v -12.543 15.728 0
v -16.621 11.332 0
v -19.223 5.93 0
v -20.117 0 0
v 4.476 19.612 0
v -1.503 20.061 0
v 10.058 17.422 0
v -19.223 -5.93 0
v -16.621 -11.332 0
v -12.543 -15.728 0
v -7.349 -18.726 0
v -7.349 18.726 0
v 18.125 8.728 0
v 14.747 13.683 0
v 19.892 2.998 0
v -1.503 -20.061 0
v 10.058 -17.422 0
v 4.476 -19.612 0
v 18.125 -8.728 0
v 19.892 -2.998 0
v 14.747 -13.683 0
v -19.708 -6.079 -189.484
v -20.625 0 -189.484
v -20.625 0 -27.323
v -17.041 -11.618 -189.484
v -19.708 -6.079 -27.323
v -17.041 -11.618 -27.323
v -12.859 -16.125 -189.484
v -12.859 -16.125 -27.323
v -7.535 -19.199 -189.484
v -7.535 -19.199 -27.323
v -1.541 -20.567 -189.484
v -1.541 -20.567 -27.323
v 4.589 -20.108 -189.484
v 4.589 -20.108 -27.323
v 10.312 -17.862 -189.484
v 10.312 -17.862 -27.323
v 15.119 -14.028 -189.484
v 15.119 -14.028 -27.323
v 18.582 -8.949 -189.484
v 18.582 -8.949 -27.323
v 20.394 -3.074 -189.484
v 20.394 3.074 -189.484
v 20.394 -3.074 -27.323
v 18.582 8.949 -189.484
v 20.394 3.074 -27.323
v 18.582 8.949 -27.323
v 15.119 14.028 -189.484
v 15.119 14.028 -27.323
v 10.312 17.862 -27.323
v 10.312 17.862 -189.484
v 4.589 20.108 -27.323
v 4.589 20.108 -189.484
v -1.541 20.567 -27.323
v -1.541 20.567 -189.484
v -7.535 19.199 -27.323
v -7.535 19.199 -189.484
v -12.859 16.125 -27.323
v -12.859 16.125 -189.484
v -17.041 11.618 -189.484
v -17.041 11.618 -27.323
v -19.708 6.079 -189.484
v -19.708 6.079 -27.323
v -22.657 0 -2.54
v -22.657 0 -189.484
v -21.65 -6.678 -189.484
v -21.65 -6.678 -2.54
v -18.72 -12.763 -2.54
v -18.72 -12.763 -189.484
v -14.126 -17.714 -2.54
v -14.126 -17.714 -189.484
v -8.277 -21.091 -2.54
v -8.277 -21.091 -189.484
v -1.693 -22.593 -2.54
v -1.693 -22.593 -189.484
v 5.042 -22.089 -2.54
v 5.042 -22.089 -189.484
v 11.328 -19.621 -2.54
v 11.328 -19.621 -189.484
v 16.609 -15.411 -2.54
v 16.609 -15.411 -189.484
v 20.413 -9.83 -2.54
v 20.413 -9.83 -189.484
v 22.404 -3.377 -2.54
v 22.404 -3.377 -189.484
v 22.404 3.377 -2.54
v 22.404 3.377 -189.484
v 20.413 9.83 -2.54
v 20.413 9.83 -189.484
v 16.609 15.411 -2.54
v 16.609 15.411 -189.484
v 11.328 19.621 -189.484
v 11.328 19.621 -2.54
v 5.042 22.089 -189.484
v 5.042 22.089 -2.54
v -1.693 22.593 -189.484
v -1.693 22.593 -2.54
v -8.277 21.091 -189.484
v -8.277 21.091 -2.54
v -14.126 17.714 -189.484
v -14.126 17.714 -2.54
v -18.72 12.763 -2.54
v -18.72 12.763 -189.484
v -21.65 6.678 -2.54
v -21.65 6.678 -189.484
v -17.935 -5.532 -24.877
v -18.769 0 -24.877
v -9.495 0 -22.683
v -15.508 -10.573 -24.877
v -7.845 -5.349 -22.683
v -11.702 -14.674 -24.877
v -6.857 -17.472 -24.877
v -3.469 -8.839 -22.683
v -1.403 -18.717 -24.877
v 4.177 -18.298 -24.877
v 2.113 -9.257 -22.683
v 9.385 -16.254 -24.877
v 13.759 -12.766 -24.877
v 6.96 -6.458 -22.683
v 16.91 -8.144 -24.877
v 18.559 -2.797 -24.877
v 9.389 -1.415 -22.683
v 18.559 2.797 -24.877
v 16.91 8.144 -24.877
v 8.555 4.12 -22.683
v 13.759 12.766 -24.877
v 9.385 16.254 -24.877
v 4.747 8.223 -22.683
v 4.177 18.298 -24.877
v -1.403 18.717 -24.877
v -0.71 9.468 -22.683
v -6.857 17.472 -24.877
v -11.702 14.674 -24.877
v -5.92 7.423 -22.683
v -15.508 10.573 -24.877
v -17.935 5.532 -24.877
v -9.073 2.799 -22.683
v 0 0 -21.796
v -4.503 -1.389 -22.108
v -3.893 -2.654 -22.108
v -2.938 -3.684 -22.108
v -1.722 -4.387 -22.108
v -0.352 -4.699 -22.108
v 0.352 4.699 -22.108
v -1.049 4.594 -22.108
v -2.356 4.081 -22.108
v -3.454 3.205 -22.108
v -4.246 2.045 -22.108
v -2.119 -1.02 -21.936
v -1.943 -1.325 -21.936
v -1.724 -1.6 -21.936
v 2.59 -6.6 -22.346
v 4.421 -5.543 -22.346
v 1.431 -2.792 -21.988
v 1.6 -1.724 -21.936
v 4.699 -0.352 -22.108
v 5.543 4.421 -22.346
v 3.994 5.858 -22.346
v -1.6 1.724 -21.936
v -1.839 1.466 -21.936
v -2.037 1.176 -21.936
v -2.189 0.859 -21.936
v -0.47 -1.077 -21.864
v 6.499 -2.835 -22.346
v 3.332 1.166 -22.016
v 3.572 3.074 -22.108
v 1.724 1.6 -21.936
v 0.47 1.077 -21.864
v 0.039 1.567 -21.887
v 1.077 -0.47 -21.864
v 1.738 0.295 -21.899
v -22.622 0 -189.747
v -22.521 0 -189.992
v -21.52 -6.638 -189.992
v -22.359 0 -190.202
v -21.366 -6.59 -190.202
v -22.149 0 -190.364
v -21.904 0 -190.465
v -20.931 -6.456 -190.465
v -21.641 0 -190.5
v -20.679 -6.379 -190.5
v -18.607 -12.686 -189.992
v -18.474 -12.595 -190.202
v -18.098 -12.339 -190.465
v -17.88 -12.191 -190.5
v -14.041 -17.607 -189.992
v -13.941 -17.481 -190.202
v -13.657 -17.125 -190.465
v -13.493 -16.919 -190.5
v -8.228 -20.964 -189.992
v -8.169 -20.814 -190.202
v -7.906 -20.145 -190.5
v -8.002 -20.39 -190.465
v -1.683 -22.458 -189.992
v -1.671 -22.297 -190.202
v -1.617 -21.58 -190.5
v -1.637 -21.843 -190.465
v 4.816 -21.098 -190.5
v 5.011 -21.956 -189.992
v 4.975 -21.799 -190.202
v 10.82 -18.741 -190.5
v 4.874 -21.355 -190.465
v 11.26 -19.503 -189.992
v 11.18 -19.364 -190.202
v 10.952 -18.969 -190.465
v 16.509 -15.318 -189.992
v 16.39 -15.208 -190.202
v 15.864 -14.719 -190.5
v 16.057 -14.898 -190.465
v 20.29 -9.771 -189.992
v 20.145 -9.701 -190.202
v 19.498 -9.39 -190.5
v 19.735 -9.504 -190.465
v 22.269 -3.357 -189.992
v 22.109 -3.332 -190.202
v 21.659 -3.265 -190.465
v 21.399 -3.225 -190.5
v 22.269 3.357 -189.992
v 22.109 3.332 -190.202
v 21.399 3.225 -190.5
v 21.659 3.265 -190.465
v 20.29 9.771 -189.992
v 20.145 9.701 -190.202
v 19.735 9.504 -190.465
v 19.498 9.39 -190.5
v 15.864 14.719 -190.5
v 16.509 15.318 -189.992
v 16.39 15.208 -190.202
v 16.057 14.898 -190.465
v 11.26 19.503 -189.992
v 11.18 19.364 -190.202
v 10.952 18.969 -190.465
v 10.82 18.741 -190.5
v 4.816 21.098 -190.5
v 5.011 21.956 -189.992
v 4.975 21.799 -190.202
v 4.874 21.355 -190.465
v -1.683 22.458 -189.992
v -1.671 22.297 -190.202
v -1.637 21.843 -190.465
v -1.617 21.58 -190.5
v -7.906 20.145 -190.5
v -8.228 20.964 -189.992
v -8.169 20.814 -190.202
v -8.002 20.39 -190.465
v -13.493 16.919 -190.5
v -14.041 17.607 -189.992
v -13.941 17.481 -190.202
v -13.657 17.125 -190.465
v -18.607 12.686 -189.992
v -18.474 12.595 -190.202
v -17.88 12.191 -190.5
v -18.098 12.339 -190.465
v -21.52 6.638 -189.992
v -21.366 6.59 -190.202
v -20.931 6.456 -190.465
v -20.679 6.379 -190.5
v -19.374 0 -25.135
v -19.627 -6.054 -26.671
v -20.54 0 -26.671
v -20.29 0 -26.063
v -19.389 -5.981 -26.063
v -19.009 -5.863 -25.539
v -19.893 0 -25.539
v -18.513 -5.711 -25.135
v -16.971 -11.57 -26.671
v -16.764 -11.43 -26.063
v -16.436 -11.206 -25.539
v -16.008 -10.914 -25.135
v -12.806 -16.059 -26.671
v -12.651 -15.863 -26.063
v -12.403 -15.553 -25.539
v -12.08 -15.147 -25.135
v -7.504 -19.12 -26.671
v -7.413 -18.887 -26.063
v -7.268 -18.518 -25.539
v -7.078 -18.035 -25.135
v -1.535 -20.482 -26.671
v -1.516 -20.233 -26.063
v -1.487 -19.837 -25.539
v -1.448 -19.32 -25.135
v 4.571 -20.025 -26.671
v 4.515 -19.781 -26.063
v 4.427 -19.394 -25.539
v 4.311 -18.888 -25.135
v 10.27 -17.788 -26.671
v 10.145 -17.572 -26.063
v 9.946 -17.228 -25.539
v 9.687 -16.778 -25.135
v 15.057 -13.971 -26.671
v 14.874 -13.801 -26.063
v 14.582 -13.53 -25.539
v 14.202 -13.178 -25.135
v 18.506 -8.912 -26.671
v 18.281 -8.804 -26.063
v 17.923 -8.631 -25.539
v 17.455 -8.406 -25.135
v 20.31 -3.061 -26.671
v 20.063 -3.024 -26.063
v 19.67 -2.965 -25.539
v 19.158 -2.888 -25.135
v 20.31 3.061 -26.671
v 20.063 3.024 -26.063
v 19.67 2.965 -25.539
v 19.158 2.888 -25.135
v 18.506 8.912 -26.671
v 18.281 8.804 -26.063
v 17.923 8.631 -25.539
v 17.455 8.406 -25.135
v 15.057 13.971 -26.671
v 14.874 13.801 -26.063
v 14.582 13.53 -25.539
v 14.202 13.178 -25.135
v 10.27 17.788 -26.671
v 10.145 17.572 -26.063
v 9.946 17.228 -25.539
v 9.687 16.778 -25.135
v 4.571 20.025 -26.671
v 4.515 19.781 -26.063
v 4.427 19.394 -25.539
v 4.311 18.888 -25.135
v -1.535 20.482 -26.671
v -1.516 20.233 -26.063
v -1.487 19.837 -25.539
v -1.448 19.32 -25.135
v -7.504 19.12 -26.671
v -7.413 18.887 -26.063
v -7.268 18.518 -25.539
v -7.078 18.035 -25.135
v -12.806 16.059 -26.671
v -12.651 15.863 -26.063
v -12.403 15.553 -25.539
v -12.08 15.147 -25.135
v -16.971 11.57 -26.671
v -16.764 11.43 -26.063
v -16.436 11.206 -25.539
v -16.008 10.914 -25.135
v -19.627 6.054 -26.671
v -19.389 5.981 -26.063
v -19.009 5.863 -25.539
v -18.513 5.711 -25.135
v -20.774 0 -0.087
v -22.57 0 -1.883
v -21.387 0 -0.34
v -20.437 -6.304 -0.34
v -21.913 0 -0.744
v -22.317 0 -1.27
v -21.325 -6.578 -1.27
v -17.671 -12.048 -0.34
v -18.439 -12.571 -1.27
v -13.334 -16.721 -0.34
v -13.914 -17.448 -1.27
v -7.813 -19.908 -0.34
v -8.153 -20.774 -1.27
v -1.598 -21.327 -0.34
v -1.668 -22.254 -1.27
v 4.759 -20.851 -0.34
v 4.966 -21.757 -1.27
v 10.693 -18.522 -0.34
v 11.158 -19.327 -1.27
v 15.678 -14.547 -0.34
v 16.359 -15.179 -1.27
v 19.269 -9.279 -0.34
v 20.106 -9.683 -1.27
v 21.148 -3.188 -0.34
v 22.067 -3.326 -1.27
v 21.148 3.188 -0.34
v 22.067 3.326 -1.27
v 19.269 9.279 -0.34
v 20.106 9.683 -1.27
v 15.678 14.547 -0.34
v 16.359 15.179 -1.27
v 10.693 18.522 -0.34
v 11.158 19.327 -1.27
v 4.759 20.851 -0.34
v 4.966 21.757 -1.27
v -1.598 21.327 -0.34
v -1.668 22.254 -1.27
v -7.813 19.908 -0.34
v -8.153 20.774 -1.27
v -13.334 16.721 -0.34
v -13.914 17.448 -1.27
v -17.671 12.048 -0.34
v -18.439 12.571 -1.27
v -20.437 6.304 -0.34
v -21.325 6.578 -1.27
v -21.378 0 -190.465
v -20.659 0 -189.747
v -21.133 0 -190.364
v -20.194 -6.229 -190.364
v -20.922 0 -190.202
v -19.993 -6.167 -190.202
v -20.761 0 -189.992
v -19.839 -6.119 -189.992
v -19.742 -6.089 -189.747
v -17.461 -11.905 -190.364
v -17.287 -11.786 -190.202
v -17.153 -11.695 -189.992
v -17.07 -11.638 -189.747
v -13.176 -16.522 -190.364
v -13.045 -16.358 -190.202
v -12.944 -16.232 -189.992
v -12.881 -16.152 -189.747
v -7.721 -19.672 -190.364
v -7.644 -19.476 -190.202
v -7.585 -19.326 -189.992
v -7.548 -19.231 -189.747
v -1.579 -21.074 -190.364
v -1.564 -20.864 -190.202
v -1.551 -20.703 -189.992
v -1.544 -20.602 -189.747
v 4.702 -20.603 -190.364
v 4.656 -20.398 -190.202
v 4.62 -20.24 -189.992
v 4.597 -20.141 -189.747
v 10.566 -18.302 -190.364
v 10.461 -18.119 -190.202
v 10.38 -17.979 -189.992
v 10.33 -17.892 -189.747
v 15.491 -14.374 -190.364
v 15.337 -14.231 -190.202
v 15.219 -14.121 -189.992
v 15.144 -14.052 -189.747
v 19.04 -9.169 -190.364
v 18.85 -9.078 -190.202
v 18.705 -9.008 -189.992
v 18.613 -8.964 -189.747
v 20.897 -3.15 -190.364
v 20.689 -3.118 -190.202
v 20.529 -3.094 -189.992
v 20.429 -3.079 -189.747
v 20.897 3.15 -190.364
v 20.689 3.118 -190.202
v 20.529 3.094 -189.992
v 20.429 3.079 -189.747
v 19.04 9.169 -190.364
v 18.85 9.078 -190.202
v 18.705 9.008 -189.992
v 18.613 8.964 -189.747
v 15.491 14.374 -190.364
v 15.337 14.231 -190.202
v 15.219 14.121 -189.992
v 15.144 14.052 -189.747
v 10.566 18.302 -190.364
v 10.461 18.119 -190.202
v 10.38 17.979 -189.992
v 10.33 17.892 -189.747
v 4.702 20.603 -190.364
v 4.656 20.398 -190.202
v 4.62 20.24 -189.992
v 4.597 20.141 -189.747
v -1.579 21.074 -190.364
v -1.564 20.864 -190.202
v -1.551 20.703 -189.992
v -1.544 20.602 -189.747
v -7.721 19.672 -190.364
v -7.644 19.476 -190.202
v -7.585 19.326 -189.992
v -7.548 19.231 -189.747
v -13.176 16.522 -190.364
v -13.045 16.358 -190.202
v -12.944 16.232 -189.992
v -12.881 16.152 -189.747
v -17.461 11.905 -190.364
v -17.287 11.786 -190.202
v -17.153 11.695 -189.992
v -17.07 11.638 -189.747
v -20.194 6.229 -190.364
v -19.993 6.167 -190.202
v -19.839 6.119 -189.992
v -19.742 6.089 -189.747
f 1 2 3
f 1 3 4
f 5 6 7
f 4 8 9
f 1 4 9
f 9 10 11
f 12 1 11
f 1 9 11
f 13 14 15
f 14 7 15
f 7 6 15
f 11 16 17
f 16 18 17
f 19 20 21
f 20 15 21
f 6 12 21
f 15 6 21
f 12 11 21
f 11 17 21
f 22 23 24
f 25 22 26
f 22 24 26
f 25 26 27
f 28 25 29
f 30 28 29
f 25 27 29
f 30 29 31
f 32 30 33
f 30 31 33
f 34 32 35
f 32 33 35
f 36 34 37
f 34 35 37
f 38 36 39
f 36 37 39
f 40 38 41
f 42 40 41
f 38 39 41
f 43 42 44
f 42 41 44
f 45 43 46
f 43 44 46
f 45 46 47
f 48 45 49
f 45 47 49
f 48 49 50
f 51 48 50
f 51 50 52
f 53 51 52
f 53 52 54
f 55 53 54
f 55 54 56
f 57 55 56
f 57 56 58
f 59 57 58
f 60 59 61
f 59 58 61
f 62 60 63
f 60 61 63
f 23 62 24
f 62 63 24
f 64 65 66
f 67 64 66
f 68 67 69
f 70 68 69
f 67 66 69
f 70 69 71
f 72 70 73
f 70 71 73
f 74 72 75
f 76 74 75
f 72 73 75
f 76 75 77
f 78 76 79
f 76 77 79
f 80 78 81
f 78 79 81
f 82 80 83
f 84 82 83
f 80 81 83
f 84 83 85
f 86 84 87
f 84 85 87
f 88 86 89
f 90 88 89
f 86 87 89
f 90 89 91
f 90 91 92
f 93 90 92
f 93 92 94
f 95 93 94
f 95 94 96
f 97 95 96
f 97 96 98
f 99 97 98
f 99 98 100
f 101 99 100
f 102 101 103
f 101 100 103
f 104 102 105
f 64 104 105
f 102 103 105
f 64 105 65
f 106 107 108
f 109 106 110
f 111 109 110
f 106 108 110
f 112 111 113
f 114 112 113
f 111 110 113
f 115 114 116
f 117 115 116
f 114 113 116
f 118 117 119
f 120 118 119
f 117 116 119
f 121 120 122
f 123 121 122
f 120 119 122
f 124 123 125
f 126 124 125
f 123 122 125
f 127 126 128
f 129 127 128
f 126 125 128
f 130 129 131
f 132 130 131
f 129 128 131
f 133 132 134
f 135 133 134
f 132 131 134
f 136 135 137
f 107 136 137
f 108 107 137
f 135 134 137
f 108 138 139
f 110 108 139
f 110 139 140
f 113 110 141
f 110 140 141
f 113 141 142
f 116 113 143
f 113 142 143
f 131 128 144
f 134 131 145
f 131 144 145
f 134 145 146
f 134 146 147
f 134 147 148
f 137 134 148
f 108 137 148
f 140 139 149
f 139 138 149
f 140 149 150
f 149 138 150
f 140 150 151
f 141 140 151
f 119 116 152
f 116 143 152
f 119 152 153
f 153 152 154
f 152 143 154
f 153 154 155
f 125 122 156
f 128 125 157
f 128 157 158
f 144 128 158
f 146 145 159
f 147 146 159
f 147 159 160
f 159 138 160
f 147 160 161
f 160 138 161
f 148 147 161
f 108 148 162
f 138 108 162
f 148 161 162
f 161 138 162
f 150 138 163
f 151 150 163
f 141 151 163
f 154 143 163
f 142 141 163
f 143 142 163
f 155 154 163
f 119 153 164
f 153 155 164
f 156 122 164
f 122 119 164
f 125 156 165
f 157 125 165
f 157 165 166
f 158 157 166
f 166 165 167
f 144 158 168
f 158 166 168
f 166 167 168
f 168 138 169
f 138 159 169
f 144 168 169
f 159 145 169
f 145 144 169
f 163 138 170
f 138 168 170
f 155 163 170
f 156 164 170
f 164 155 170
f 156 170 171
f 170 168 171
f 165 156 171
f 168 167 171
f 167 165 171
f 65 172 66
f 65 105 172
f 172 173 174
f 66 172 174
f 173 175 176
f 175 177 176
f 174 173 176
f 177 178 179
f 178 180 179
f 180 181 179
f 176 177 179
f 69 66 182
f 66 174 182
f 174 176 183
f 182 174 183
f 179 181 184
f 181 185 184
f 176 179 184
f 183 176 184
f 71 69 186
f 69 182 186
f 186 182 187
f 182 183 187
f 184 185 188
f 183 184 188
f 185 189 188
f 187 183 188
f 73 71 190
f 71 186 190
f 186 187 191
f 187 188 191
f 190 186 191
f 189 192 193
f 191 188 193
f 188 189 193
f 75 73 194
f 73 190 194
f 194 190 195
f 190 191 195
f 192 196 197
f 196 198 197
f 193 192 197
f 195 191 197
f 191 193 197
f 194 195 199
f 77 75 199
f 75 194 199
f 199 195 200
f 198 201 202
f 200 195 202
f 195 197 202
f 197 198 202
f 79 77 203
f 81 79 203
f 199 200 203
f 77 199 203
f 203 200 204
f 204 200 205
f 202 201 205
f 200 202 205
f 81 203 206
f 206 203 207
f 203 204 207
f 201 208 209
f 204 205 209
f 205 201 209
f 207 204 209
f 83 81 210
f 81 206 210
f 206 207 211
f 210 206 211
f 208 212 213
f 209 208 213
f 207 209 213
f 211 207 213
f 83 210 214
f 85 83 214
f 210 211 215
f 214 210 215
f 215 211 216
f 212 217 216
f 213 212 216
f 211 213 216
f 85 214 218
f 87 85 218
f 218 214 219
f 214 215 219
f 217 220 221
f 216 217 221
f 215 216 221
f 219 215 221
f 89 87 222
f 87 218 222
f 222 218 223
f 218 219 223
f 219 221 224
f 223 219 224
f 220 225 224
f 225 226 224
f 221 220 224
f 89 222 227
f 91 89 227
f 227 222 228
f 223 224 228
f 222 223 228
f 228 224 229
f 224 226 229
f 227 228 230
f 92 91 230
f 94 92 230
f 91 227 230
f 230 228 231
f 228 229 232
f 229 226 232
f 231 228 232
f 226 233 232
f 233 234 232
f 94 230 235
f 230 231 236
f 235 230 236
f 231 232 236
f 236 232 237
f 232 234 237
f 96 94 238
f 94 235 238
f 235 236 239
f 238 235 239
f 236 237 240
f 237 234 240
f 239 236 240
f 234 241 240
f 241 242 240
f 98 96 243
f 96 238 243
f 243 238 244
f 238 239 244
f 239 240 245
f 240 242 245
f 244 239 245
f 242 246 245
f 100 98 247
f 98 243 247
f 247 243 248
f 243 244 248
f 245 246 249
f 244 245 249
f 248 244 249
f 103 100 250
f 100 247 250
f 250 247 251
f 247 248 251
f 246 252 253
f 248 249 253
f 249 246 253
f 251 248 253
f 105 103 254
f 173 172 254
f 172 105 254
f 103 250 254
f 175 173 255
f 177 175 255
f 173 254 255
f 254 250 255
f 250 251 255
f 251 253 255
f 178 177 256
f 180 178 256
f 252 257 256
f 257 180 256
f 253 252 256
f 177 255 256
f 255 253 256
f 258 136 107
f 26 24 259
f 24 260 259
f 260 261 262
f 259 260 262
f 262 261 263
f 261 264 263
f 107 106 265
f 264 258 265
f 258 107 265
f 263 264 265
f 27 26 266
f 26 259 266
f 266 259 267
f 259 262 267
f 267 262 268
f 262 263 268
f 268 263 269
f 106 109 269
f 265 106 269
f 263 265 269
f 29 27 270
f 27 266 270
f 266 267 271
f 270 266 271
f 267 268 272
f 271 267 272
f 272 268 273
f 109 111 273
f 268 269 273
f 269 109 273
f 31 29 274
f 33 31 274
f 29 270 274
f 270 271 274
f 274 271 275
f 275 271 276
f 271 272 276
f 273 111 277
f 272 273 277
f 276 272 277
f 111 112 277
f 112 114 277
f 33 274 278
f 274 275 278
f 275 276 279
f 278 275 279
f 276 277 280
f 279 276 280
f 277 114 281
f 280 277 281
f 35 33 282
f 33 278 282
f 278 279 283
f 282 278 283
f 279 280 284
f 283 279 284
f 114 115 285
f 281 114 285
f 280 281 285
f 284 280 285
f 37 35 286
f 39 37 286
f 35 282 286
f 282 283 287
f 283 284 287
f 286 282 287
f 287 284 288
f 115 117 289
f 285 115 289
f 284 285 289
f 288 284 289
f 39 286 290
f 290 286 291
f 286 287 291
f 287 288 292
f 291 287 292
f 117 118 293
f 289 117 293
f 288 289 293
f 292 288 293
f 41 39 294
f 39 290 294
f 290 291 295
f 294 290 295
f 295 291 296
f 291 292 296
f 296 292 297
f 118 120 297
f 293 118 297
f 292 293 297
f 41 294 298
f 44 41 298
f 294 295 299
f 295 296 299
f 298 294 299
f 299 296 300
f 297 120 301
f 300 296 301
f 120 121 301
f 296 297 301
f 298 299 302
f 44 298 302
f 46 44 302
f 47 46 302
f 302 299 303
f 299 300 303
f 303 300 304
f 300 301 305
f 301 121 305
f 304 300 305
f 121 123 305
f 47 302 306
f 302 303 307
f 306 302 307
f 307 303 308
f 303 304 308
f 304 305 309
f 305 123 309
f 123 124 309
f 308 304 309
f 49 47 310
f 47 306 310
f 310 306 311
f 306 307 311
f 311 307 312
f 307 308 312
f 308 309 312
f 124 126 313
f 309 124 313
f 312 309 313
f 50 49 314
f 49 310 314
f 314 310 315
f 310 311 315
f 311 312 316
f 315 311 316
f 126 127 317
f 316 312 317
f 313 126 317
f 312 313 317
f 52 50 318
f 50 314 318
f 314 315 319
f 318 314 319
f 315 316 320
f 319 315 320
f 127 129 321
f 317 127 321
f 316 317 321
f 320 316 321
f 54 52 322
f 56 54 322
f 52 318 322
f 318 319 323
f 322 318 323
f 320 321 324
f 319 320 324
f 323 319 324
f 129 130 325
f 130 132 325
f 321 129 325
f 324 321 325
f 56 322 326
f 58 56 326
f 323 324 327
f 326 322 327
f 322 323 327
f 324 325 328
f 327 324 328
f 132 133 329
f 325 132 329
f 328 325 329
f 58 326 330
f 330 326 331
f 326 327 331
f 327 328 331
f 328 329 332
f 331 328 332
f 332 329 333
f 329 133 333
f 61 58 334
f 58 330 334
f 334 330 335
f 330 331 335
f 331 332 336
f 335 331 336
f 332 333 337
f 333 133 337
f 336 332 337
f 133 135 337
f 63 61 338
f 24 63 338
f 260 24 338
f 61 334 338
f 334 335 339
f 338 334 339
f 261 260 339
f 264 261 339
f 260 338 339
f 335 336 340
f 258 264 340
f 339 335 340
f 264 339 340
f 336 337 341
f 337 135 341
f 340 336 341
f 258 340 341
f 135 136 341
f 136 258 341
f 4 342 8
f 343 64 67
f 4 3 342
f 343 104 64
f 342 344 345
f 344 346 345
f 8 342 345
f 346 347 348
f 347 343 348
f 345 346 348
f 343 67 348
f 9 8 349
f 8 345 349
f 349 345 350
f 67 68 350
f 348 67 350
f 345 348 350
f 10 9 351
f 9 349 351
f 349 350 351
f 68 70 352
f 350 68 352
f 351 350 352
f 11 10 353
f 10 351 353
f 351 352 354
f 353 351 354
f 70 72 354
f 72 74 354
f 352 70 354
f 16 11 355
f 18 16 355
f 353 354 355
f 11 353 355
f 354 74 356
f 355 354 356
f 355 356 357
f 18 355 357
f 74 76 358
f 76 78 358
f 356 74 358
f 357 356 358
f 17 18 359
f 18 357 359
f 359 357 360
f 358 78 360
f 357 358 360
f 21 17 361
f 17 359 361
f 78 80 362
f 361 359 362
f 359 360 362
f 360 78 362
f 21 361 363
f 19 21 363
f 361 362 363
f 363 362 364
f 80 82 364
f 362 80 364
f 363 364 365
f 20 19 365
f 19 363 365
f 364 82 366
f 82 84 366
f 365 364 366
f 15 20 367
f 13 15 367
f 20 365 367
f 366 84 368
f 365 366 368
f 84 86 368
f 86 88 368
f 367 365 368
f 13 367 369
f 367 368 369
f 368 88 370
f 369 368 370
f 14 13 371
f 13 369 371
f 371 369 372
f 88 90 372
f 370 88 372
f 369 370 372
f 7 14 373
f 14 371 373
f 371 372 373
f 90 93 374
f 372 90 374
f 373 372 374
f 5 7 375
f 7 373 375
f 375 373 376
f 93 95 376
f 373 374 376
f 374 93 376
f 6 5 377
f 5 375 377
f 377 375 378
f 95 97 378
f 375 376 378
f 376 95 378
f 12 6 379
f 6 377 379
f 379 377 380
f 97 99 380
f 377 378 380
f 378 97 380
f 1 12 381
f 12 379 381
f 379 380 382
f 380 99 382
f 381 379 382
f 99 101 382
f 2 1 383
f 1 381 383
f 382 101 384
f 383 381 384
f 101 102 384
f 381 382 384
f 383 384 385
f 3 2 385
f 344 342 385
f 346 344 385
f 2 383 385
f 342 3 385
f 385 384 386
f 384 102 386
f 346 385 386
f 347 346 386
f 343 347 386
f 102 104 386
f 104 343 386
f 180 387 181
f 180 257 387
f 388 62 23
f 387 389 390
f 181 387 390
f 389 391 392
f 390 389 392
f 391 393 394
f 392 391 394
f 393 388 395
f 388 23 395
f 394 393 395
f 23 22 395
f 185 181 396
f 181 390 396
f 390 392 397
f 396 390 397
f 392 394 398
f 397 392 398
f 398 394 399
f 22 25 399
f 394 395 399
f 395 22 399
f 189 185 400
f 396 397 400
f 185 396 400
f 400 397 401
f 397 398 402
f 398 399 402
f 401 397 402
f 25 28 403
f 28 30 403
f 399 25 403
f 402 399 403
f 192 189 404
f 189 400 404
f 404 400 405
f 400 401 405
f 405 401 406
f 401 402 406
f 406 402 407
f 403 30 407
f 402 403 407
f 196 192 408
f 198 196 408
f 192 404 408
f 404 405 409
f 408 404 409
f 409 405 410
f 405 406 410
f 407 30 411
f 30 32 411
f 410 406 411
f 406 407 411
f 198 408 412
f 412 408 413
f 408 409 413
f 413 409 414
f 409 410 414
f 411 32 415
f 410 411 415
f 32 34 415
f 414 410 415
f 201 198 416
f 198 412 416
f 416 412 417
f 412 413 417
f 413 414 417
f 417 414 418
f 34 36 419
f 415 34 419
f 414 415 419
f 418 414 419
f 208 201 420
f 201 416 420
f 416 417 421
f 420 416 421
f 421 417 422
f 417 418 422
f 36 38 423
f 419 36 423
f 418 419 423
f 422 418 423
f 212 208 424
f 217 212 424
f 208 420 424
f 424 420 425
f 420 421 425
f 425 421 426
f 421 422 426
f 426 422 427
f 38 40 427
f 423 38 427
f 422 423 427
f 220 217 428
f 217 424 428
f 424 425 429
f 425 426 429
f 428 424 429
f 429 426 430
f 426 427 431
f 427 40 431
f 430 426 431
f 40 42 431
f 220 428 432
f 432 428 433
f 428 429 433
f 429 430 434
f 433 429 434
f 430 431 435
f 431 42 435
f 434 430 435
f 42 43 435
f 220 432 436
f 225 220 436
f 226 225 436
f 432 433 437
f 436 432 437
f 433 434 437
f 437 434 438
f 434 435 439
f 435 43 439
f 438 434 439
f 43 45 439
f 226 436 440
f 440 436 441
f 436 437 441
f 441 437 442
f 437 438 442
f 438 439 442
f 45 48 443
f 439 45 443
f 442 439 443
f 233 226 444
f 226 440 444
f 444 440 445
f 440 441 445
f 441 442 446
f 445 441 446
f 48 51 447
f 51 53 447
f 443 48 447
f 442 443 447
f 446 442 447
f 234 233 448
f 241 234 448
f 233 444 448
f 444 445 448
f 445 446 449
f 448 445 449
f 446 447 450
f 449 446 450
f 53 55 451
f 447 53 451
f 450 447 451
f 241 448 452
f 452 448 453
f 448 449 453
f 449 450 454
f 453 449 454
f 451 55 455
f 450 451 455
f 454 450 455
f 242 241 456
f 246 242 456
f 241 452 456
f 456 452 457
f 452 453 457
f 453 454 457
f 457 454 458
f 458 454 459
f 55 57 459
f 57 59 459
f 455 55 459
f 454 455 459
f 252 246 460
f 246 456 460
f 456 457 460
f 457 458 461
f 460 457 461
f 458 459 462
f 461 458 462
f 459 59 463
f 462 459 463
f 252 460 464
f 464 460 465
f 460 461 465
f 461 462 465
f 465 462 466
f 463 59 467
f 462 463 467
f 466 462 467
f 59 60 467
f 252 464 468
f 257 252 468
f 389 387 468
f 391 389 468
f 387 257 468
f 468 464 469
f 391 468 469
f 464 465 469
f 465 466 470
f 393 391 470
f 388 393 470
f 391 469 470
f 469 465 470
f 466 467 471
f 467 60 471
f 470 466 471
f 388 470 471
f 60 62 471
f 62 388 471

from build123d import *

# Parameters (mm, degrees)
F2_R = 2.54
F3_R = 1.01599


# Not quite as in the source:
# - a fillet or chamfer is up to 0.001 mm smaller than in the source, because OpenCascade refuses the exact size


with BuildPart() as f1:
    # F0 (on Front) → F1 (revolve)
    with BuildSketch(Plane.XZ):
        with BuildLine():
            Line((0, -21.7963978648), (0, 0))
            Line((0, 0), (-22.6568, 0))
            Line((-22.6568, 0), (-22.6568, -190.5))
            Line((-22.6568, -190.5), (-20.6248, -190.5))
            Line((-20.6248, -190.5), (-20.6248, -27.3231199056))
            ThreePointArc((-20.6248, -27.3231199056), (-20.108359218, -25.7879299854), (-18.7690455975, -24.877019343))
            add(Edge.make_bspline(
                [(-18.7690455975, -24.877019343), (-15.7267844832, -24.0260102693), (-9.2902414756, -22.325160199), (-3.2160062892, -21.9794397154), (0, -21.7963978648)],
                knots=[0.0872743239, 0.0872743239, 0.0872743239, 0.0872743239, 0.5167570197, 1, 1, 1, 1], degree=3))
        make_face()
    revolve(axis=Axis((0, 0, -10.8981989324), (0, 0, 1)))

    # F2
    f2_edges = [f1.edges().sort_by_distance(p)[0] for p in [
        (22.6568, 0, 0),
    ]]
    fillet(f2_edges, radius=F2_R)

    # F3 (radius 1.016 in the source; OpenCascade refuses exactly that, so slightly less here)
    f3_edges = [f1.edges().sort_by_distance(p)[0] for p in [
        (22.6568, 0, -190.5),
        (20.6248, 0, -190.5),
    ]]
    fillet(f3_edges, radius=F3_R)


solid = f1.part
